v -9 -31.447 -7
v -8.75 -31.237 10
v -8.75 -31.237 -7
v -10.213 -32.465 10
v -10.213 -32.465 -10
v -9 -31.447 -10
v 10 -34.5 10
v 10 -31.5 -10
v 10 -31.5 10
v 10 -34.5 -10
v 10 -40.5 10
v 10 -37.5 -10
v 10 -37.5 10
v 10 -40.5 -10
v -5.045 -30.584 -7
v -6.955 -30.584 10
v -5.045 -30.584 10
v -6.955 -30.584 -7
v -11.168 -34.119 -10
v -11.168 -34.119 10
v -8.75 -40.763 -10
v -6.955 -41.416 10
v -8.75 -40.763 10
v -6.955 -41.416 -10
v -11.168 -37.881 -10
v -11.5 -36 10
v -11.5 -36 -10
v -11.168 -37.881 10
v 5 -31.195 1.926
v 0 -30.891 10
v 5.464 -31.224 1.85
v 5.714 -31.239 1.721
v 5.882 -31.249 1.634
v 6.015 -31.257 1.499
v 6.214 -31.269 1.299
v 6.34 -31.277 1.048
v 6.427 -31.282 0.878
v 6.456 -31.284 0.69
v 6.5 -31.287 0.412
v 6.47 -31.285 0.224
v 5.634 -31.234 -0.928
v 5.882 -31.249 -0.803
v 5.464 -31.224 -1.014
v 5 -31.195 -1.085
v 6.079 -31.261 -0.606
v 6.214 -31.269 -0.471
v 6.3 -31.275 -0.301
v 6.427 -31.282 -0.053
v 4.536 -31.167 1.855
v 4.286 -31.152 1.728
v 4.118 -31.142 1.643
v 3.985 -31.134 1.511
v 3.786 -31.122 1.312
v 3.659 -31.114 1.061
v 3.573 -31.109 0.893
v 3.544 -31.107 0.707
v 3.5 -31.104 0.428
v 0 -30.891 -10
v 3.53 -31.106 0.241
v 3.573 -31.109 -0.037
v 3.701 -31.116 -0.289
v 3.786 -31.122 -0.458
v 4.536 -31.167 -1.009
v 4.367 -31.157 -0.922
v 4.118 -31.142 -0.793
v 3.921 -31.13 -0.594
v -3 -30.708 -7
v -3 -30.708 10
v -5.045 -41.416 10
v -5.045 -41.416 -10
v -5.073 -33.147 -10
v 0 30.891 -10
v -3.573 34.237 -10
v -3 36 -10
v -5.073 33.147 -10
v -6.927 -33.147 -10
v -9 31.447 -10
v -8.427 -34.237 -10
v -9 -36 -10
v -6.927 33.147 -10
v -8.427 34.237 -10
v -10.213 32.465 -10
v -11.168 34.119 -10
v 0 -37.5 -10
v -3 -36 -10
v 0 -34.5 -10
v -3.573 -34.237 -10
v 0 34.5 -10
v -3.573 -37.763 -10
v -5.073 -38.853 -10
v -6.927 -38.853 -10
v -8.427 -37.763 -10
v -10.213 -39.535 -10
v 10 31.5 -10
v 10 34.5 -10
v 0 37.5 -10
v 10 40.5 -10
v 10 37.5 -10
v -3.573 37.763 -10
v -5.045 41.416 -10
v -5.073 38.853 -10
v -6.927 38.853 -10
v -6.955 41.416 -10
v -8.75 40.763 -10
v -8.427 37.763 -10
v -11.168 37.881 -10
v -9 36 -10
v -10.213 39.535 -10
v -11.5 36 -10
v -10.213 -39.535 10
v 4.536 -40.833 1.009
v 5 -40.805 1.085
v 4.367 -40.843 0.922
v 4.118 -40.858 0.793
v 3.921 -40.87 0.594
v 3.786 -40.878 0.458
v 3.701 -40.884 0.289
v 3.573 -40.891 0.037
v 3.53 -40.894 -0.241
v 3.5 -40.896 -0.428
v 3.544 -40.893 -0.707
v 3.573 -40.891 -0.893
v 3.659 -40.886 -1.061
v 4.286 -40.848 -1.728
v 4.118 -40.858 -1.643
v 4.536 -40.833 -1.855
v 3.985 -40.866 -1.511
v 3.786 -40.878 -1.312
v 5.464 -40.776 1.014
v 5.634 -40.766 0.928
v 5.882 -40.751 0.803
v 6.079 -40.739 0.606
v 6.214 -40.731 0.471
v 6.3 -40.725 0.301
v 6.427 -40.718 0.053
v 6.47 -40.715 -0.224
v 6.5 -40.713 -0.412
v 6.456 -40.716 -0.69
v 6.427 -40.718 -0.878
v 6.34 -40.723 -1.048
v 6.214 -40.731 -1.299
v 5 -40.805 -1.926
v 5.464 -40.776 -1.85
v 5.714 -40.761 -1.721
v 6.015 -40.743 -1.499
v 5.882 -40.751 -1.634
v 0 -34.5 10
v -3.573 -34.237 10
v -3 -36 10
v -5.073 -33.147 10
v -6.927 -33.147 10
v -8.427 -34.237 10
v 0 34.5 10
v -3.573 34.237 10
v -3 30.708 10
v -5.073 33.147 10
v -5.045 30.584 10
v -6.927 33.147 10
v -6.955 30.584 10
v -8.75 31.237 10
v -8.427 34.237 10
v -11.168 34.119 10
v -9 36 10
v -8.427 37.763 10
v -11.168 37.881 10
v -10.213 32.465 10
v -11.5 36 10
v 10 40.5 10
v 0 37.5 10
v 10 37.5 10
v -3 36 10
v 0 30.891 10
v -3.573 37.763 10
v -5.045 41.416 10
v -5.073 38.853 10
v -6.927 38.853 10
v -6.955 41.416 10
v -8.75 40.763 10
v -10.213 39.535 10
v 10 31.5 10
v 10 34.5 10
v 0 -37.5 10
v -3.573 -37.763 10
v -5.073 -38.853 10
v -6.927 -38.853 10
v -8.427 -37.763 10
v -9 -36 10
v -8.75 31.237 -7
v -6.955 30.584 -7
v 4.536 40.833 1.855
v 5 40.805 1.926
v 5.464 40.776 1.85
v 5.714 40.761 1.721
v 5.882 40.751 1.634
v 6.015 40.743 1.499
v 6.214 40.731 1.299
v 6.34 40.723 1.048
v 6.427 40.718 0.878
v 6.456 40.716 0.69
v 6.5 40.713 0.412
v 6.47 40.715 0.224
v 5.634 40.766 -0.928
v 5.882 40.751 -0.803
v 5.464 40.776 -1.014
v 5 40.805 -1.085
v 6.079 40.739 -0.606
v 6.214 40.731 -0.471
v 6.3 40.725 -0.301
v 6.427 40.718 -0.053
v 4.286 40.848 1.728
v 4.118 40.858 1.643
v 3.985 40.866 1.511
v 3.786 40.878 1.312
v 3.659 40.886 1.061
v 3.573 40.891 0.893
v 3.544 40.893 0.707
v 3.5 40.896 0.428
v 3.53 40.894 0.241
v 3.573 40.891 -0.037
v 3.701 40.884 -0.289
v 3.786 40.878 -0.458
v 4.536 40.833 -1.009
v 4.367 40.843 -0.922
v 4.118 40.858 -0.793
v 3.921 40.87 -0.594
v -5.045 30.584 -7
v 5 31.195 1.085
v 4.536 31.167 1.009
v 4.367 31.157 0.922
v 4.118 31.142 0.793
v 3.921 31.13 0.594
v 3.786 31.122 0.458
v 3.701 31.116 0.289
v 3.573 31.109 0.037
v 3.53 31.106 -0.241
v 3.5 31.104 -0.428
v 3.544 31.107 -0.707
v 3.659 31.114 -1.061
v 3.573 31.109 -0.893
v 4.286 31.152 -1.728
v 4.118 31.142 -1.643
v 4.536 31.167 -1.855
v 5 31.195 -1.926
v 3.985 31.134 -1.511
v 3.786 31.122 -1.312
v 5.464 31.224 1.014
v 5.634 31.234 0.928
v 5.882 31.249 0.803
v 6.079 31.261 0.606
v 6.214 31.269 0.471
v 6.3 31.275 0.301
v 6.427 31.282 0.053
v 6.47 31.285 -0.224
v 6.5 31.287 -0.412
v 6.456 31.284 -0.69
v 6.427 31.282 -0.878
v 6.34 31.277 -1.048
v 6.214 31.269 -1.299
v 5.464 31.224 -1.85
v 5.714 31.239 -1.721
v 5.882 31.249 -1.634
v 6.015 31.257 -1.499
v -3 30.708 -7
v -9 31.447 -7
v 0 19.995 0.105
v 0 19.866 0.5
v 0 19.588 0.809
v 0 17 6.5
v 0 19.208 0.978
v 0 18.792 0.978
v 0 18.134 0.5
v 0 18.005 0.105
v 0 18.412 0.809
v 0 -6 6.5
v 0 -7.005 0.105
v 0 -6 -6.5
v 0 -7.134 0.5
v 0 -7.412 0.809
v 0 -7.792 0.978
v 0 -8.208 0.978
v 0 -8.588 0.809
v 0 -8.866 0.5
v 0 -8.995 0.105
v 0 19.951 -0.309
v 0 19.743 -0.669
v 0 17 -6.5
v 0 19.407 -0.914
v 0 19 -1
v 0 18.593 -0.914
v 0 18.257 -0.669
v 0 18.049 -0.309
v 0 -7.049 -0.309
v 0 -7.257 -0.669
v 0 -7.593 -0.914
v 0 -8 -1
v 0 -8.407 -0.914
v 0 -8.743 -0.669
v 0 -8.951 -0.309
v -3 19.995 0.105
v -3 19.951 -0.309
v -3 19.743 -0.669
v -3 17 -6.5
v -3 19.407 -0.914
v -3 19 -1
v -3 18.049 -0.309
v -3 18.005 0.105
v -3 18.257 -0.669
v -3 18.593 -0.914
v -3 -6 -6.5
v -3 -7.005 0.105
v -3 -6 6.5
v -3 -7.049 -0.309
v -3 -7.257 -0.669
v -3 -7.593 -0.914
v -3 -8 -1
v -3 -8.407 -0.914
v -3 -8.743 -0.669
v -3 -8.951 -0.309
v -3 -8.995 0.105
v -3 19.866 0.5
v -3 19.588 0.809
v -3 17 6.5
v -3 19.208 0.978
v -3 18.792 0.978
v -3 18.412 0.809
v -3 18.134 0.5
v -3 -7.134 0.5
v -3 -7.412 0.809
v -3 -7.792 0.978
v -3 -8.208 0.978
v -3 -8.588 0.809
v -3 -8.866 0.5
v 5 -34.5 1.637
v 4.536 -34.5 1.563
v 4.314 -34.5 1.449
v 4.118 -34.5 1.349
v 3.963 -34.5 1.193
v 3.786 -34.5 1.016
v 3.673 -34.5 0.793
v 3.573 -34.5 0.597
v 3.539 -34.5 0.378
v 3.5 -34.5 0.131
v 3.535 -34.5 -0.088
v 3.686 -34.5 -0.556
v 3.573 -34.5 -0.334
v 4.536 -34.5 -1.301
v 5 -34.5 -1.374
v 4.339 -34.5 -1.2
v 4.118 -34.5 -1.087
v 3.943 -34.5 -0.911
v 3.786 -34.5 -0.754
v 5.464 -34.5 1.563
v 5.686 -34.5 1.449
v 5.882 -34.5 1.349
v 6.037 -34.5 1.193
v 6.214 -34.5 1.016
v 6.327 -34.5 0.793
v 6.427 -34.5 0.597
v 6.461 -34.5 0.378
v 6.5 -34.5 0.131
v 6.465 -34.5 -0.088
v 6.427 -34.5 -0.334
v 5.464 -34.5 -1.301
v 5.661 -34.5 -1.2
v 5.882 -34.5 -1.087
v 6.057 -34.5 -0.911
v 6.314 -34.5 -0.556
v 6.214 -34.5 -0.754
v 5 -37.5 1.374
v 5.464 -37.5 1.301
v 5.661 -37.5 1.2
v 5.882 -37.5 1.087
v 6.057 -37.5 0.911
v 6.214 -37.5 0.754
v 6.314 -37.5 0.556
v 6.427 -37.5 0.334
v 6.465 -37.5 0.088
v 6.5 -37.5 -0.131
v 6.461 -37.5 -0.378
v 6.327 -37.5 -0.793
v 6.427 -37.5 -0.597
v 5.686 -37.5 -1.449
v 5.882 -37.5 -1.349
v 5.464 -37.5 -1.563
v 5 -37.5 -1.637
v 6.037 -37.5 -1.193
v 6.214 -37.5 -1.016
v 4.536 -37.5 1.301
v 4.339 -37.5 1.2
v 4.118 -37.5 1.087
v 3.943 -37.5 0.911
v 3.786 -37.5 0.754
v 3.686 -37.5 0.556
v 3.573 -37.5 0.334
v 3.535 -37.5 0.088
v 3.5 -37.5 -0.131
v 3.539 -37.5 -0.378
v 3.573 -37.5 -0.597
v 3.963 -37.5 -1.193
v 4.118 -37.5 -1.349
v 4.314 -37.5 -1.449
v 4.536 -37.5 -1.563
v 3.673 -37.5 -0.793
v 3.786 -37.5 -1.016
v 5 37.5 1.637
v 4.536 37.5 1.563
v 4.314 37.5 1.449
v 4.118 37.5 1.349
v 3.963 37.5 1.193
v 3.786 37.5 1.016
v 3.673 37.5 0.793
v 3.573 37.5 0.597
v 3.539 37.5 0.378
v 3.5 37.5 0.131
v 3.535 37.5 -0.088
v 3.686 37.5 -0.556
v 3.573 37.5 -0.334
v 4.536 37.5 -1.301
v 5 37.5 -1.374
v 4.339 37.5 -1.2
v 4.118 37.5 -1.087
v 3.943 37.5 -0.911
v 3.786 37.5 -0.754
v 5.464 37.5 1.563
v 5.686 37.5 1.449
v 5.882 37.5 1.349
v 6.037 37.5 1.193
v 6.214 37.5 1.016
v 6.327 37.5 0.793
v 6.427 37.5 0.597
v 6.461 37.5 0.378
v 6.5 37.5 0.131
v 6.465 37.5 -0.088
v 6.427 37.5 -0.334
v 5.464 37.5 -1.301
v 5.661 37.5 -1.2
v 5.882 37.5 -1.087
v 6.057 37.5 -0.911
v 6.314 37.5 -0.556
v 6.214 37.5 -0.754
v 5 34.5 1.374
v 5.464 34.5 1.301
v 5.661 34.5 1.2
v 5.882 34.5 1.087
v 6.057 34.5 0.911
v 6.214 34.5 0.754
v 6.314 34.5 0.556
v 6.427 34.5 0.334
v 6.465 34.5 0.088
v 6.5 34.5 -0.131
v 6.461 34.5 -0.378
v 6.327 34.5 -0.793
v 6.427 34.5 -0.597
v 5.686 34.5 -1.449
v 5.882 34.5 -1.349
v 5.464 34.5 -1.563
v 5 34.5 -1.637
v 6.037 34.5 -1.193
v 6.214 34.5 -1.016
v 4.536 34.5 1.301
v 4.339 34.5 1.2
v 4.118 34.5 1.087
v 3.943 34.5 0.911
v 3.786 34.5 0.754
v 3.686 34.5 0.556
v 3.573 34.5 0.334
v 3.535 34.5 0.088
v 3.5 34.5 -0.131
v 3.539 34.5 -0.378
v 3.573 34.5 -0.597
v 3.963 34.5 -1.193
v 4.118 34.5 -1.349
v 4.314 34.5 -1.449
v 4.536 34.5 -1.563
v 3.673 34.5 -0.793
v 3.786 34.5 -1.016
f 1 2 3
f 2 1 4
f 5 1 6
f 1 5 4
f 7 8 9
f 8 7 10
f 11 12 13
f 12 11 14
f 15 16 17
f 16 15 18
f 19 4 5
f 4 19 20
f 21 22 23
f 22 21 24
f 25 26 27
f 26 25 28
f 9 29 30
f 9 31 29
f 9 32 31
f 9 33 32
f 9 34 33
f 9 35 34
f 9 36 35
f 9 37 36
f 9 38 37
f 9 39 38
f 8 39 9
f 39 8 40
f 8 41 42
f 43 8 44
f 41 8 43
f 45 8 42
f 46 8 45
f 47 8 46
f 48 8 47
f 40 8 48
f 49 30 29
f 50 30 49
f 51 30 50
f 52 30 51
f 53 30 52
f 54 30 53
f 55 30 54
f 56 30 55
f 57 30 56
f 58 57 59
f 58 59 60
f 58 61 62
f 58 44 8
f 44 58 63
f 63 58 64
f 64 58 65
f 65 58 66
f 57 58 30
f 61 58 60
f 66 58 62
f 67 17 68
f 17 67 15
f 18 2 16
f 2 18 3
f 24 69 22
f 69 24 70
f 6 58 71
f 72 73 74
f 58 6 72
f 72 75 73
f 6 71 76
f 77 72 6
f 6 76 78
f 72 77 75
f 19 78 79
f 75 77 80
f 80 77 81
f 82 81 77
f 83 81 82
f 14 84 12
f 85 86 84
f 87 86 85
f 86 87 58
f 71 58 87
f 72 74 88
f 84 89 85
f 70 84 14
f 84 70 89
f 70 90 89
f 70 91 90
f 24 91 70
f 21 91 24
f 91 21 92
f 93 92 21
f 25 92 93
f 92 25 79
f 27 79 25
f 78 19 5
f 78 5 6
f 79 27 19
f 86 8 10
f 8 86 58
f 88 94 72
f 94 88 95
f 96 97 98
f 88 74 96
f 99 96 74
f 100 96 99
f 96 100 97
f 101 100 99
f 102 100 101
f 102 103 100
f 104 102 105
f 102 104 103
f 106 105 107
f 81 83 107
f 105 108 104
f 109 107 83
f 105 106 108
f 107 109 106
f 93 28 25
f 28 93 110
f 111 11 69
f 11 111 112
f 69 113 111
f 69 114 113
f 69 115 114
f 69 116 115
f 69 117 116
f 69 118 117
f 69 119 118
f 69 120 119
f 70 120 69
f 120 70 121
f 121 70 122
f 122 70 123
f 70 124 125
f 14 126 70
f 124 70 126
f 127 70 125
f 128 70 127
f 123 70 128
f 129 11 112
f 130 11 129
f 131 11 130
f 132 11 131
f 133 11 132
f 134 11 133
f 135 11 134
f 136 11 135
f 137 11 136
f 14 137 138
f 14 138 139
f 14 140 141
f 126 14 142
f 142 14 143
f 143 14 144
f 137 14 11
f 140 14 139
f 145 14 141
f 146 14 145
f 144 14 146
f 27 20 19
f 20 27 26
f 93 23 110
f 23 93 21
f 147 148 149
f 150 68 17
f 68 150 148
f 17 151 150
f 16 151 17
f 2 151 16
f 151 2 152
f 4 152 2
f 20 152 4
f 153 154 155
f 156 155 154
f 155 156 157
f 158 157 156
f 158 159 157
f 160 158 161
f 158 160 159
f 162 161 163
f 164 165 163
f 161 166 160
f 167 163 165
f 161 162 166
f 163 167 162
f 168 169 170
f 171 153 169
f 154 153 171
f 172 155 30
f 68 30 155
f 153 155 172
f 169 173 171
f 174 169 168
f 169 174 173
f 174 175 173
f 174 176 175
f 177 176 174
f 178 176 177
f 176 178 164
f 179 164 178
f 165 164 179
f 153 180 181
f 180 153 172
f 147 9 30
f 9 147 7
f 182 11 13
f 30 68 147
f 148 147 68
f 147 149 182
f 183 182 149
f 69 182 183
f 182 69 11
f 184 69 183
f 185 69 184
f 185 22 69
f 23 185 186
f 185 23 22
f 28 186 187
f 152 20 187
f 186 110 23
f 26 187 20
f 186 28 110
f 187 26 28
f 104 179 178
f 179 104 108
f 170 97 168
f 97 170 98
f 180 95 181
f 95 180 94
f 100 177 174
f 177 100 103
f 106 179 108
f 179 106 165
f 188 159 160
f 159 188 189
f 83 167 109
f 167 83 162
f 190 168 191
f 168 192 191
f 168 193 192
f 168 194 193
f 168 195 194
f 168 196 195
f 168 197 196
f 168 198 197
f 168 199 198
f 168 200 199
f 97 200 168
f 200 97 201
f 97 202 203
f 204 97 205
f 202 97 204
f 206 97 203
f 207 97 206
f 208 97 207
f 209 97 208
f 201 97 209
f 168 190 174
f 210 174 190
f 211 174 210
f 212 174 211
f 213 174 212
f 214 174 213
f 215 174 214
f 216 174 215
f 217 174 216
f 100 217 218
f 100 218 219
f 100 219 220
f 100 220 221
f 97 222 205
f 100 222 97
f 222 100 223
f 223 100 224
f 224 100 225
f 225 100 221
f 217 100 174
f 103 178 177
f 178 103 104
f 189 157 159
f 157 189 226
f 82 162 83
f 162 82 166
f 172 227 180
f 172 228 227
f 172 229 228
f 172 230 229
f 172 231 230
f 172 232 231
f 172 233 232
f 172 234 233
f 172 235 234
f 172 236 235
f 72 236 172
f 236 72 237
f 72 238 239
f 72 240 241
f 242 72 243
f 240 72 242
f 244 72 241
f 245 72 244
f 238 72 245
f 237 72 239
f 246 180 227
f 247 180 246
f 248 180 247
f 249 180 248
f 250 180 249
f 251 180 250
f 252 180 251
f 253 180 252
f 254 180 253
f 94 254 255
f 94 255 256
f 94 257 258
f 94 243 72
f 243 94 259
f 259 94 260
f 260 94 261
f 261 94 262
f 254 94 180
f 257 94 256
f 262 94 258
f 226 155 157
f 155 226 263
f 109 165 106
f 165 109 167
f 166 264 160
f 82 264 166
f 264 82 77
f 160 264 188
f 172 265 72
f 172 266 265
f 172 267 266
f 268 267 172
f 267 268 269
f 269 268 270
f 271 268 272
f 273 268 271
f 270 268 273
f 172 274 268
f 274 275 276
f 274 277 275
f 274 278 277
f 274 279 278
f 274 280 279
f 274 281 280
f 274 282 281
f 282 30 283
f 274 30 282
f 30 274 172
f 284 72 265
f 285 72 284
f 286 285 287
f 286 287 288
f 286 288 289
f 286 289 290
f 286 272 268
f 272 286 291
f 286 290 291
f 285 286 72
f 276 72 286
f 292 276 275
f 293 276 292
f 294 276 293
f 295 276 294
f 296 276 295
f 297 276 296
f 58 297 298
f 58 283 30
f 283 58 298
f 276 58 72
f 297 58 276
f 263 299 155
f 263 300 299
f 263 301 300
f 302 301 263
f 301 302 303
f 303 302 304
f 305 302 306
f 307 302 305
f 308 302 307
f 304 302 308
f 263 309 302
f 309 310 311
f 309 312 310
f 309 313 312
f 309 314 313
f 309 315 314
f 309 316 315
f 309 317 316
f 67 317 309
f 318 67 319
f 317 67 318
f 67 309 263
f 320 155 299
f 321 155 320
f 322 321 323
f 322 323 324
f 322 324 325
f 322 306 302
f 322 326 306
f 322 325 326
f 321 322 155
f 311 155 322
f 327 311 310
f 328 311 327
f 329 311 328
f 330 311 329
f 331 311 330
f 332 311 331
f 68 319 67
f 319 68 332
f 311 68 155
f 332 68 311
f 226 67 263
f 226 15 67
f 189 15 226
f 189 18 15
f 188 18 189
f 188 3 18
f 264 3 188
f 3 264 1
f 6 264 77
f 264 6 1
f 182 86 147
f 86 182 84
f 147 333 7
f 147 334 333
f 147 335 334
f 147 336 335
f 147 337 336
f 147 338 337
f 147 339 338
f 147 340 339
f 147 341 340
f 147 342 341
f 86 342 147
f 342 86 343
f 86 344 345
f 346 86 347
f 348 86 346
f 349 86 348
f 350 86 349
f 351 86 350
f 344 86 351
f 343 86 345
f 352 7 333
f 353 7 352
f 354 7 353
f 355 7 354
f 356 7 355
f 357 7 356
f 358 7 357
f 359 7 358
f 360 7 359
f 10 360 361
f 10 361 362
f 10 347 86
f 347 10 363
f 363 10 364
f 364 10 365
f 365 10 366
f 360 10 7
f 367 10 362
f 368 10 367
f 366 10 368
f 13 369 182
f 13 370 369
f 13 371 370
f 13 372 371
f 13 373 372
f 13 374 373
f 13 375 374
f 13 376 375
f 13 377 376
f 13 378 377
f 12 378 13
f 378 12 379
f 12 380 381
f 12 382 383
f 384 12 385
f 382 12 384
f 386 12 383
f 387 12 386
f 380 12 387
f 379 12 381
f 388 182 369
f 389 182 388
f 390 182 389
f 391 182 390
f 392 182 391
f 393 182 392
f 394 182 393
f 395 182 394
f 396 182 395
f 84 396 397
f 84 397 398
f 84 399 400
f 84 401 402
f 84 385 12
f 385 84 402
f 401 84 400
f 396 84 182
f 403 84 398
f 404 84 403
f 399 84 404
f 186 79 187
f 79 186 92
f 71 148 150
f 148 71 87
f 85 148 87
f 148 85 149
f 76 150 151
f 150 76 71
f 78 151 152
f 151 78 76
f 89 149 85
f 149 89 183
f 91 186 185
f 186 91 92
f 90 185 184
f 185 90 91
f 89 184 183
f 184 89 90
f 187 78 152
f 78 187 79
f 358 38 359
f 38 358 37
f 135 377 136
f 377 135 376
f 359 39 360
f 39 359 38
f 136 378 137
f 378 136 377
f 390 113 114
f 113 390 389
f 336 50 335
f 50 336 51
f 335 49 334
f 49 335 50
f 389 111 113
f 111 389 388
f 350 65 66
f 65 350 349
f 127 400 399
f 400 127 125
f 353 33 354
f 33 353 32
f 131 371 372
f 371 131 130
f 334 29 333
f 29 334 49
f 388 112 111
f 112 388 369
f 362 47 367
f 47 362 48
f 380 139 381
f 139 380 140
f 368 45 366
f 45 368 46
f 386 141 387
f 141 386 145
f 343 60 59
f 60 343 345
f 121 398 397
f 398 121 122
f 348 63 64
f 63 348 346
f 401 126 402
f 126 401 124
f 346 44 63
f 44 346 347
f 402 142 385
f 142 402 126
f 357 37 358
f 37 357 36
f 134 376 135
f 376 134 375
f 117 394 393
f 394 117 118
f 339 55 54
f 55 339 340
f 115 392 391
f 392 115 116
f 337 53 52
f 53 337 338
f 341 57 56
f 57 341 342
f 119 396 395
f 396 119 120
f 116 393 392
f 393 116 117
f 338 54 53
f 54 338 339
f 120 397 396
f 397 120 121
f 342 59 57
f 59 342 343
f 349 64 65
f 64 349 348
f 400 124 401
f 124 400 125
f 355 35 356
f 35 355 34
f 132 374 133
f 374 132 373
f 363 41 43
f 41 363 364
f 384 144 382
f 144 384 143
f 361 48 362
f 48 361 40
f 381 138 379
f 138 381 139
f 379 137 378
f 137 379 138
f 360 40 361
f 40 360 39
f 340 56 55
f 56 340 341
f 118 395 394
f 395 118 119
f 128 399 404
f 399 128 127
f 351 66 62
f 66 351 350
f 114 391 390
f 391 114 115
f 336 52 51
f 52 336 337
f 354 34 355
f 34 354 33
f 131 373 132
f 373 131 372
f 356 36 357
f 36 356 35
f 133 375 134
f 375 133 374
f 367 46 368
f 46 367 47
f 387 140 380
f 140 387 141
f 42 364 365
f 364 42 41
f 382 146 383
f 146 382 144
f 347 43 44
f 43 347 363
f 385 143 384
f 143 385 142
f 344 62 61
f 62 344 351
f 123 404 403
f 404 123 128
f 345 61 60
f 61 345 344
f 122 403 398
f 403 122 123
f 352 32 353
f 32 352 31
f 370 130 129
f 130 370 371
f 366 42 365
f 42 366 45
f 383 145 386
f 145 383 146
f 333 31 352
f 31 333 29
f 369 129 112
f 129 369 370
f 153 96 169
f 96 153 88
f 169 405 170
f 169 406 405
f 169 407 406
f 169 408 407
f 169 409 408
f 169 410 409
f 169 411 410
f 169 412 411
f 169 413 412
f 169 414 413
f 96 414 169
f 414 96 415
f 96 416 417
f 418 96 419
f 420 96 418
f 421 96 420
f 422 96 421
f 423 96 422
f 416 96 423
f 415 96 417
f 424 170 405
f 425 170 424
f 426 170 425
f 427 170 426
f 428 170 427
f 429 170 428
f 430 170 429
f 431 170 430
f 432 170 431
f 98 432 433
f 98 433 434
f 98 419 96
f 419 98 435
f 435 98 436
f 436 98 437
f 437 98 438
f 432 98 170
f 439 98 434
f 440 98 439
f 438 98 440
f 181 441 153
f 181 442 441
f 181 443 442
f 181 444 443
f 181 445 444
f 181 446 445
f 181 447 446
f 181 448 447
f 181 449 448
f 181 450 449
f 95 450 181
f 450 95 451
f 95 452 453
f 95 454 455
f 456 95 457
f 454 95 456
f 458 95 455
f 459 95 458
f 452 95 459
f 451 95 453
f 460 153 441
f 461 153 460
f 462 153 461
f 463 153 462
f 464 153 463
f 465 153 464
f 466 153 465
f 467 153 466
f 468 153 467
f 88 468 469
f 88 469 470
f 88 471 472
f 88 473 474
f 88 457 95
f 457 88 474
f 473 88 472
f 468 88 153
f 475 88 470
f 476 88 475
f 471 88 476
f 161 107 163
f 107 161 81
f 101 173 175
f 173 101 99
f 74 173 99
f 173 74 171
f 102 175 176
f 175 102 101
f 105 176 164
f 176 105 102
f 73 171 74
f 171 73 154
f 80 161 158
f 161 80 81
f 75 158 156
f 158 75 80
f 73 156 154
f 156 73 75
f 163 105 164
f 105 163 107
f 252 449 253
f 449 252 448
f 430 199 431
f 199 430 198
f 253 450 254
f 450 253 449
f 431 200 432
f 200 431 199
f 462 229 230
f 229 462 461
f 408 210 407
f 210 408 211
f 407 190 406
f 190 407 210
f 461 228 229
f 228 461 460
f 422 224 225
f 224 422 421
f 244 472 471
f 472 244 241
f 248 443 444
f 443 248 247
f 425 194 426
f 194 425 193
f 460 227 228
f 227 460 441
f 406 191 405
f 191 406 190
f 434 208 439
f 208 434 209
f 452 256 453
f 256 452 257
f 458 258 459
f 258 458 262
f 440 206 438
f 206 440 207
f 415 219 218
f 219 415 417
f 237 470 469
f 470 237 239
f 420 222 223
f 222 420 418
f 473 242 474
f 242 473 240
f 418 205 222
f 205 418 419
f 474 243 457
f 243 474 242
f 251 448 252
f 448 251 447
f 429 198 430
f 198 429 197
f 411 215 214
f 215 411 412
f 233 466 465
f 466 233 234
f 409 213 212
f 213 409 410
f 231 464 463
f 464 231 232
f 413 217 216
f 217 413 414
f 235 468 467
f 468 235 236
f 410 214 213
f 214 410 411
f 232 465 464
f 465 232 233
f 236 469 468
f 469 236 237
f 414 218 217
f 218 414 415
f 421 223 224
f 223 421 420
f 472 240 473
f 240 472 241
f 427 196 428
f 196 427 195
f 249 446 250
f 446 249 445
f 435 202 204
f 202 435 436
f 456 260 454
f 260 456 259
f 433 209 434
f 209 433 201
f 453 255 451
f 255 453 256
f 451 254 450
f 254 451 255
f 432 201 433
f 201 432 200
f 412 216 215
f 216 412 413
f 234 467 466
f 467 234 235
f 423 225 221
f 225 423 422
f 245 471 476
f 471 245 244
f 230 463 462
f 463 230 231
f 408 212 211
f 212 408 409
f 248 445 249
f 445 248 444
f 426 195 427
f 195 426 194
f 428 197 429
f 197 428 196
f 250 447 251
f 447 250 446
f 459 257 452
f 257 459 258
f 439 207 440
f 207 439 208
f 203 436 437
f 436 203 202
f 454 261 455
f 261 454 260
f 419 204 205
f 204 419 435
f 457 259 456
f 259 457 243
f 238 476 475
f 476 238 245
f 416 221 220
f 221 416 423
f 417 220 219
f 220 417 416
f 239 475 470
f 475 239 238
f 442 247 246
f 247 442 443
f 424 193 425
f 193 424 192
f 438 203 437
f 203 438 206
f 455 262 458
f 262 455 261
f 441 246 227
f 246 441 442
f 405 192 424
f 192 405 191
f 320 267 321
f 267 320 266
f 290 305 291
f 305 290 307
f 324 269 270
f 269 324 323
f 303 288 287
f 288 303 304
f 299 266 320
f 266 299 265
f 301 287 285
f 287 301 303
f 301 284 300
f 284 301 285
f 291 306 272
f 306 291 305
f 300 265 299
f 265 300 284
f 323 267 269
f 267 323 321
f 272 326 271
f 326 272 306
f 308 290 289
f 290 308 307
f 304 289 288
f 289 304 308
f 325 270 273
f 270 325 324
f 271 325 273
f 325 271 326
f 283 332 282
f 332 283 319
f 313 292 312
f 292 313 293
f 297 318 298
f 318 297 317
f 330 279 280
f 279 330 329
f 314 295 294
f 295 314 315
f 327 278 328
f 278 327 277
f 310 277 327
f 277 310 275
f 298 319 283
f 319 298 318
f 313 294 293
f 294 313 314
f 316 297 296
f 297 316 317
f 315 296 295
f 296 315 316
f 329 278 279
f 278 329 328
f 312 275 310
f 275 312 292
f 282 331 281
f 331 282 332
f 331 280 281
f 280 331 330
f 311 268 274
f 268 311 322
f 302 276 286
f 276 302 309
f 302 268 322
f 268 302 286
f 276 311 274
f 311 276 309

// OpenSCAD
// release_part


ears_distance = 72;
ears_width = 2;
ears_hole_width = ears_width + 1;
ears_length = 8;
ears_height = 10;
ears_hole_from_bottom = 5;

release_length = 20;
release_thickness = 3;

beam_diameter = 6;


servo_thickness = 13;
servo_length = 23;
servo_holes_diameter = 2;
servo_holes_distance = 27;
servo_axis_offset = 5.5;

module 888_1001(){

difference(){
  union(){
    for(i = [-1, 1])
      translate([0, ears_distance*i/2, 0]) hull(){
        translate([ears_height/2 - 2.5, 0, 0])
          cube([ears_height + 5, ears_hole_width+6, release_length], center = true);

        translate([-beam_diameter, 0, 0])
          cylinder(d = beam_diameter+5, h = release_length, center = true);
      }

    translate([-release_thickness/2, 0, 0])
      cube([release_thickness, ears_distance, release_length], center = true);

    translate([-release_thickness*3/2, 0, -release_length/2+1.5])
      cube([release_thickness*3, ears_distance, 3], center = true);
  }


    for(i = [-1, 1])
      translate([0, ears_distance*i/2, 0]){
        translate([release_thickness/2 + ears_height/2, 0, 0])
          cube([ears_height + release_thickness, ears_hole_width, release_length+1], center = true);
        translate([-beam_diameter, 0, 0])
        cylinder(d = beam_diameter, h = release_length+1, center = true);

        translate([ears_hole_from_bottom, 0, 0])
          rotate([90+5, 0, 0])
            cylinder(d = 3, h=50, center = true, $fn=20);
      }

      translate([0, servo_axis_offset, 0]){
        cube([release_thickness*3, servo_length, servo_thickness], center = true);
        for(j=[1, -1])
          translate([0, servo_holes_distance/2*j, 0])
            rotate([0, 90, 0])
              cylinder(d=servo_holes_diameter, h = 20, center = true, $fn=15);
      }



}


}


888_1001();
